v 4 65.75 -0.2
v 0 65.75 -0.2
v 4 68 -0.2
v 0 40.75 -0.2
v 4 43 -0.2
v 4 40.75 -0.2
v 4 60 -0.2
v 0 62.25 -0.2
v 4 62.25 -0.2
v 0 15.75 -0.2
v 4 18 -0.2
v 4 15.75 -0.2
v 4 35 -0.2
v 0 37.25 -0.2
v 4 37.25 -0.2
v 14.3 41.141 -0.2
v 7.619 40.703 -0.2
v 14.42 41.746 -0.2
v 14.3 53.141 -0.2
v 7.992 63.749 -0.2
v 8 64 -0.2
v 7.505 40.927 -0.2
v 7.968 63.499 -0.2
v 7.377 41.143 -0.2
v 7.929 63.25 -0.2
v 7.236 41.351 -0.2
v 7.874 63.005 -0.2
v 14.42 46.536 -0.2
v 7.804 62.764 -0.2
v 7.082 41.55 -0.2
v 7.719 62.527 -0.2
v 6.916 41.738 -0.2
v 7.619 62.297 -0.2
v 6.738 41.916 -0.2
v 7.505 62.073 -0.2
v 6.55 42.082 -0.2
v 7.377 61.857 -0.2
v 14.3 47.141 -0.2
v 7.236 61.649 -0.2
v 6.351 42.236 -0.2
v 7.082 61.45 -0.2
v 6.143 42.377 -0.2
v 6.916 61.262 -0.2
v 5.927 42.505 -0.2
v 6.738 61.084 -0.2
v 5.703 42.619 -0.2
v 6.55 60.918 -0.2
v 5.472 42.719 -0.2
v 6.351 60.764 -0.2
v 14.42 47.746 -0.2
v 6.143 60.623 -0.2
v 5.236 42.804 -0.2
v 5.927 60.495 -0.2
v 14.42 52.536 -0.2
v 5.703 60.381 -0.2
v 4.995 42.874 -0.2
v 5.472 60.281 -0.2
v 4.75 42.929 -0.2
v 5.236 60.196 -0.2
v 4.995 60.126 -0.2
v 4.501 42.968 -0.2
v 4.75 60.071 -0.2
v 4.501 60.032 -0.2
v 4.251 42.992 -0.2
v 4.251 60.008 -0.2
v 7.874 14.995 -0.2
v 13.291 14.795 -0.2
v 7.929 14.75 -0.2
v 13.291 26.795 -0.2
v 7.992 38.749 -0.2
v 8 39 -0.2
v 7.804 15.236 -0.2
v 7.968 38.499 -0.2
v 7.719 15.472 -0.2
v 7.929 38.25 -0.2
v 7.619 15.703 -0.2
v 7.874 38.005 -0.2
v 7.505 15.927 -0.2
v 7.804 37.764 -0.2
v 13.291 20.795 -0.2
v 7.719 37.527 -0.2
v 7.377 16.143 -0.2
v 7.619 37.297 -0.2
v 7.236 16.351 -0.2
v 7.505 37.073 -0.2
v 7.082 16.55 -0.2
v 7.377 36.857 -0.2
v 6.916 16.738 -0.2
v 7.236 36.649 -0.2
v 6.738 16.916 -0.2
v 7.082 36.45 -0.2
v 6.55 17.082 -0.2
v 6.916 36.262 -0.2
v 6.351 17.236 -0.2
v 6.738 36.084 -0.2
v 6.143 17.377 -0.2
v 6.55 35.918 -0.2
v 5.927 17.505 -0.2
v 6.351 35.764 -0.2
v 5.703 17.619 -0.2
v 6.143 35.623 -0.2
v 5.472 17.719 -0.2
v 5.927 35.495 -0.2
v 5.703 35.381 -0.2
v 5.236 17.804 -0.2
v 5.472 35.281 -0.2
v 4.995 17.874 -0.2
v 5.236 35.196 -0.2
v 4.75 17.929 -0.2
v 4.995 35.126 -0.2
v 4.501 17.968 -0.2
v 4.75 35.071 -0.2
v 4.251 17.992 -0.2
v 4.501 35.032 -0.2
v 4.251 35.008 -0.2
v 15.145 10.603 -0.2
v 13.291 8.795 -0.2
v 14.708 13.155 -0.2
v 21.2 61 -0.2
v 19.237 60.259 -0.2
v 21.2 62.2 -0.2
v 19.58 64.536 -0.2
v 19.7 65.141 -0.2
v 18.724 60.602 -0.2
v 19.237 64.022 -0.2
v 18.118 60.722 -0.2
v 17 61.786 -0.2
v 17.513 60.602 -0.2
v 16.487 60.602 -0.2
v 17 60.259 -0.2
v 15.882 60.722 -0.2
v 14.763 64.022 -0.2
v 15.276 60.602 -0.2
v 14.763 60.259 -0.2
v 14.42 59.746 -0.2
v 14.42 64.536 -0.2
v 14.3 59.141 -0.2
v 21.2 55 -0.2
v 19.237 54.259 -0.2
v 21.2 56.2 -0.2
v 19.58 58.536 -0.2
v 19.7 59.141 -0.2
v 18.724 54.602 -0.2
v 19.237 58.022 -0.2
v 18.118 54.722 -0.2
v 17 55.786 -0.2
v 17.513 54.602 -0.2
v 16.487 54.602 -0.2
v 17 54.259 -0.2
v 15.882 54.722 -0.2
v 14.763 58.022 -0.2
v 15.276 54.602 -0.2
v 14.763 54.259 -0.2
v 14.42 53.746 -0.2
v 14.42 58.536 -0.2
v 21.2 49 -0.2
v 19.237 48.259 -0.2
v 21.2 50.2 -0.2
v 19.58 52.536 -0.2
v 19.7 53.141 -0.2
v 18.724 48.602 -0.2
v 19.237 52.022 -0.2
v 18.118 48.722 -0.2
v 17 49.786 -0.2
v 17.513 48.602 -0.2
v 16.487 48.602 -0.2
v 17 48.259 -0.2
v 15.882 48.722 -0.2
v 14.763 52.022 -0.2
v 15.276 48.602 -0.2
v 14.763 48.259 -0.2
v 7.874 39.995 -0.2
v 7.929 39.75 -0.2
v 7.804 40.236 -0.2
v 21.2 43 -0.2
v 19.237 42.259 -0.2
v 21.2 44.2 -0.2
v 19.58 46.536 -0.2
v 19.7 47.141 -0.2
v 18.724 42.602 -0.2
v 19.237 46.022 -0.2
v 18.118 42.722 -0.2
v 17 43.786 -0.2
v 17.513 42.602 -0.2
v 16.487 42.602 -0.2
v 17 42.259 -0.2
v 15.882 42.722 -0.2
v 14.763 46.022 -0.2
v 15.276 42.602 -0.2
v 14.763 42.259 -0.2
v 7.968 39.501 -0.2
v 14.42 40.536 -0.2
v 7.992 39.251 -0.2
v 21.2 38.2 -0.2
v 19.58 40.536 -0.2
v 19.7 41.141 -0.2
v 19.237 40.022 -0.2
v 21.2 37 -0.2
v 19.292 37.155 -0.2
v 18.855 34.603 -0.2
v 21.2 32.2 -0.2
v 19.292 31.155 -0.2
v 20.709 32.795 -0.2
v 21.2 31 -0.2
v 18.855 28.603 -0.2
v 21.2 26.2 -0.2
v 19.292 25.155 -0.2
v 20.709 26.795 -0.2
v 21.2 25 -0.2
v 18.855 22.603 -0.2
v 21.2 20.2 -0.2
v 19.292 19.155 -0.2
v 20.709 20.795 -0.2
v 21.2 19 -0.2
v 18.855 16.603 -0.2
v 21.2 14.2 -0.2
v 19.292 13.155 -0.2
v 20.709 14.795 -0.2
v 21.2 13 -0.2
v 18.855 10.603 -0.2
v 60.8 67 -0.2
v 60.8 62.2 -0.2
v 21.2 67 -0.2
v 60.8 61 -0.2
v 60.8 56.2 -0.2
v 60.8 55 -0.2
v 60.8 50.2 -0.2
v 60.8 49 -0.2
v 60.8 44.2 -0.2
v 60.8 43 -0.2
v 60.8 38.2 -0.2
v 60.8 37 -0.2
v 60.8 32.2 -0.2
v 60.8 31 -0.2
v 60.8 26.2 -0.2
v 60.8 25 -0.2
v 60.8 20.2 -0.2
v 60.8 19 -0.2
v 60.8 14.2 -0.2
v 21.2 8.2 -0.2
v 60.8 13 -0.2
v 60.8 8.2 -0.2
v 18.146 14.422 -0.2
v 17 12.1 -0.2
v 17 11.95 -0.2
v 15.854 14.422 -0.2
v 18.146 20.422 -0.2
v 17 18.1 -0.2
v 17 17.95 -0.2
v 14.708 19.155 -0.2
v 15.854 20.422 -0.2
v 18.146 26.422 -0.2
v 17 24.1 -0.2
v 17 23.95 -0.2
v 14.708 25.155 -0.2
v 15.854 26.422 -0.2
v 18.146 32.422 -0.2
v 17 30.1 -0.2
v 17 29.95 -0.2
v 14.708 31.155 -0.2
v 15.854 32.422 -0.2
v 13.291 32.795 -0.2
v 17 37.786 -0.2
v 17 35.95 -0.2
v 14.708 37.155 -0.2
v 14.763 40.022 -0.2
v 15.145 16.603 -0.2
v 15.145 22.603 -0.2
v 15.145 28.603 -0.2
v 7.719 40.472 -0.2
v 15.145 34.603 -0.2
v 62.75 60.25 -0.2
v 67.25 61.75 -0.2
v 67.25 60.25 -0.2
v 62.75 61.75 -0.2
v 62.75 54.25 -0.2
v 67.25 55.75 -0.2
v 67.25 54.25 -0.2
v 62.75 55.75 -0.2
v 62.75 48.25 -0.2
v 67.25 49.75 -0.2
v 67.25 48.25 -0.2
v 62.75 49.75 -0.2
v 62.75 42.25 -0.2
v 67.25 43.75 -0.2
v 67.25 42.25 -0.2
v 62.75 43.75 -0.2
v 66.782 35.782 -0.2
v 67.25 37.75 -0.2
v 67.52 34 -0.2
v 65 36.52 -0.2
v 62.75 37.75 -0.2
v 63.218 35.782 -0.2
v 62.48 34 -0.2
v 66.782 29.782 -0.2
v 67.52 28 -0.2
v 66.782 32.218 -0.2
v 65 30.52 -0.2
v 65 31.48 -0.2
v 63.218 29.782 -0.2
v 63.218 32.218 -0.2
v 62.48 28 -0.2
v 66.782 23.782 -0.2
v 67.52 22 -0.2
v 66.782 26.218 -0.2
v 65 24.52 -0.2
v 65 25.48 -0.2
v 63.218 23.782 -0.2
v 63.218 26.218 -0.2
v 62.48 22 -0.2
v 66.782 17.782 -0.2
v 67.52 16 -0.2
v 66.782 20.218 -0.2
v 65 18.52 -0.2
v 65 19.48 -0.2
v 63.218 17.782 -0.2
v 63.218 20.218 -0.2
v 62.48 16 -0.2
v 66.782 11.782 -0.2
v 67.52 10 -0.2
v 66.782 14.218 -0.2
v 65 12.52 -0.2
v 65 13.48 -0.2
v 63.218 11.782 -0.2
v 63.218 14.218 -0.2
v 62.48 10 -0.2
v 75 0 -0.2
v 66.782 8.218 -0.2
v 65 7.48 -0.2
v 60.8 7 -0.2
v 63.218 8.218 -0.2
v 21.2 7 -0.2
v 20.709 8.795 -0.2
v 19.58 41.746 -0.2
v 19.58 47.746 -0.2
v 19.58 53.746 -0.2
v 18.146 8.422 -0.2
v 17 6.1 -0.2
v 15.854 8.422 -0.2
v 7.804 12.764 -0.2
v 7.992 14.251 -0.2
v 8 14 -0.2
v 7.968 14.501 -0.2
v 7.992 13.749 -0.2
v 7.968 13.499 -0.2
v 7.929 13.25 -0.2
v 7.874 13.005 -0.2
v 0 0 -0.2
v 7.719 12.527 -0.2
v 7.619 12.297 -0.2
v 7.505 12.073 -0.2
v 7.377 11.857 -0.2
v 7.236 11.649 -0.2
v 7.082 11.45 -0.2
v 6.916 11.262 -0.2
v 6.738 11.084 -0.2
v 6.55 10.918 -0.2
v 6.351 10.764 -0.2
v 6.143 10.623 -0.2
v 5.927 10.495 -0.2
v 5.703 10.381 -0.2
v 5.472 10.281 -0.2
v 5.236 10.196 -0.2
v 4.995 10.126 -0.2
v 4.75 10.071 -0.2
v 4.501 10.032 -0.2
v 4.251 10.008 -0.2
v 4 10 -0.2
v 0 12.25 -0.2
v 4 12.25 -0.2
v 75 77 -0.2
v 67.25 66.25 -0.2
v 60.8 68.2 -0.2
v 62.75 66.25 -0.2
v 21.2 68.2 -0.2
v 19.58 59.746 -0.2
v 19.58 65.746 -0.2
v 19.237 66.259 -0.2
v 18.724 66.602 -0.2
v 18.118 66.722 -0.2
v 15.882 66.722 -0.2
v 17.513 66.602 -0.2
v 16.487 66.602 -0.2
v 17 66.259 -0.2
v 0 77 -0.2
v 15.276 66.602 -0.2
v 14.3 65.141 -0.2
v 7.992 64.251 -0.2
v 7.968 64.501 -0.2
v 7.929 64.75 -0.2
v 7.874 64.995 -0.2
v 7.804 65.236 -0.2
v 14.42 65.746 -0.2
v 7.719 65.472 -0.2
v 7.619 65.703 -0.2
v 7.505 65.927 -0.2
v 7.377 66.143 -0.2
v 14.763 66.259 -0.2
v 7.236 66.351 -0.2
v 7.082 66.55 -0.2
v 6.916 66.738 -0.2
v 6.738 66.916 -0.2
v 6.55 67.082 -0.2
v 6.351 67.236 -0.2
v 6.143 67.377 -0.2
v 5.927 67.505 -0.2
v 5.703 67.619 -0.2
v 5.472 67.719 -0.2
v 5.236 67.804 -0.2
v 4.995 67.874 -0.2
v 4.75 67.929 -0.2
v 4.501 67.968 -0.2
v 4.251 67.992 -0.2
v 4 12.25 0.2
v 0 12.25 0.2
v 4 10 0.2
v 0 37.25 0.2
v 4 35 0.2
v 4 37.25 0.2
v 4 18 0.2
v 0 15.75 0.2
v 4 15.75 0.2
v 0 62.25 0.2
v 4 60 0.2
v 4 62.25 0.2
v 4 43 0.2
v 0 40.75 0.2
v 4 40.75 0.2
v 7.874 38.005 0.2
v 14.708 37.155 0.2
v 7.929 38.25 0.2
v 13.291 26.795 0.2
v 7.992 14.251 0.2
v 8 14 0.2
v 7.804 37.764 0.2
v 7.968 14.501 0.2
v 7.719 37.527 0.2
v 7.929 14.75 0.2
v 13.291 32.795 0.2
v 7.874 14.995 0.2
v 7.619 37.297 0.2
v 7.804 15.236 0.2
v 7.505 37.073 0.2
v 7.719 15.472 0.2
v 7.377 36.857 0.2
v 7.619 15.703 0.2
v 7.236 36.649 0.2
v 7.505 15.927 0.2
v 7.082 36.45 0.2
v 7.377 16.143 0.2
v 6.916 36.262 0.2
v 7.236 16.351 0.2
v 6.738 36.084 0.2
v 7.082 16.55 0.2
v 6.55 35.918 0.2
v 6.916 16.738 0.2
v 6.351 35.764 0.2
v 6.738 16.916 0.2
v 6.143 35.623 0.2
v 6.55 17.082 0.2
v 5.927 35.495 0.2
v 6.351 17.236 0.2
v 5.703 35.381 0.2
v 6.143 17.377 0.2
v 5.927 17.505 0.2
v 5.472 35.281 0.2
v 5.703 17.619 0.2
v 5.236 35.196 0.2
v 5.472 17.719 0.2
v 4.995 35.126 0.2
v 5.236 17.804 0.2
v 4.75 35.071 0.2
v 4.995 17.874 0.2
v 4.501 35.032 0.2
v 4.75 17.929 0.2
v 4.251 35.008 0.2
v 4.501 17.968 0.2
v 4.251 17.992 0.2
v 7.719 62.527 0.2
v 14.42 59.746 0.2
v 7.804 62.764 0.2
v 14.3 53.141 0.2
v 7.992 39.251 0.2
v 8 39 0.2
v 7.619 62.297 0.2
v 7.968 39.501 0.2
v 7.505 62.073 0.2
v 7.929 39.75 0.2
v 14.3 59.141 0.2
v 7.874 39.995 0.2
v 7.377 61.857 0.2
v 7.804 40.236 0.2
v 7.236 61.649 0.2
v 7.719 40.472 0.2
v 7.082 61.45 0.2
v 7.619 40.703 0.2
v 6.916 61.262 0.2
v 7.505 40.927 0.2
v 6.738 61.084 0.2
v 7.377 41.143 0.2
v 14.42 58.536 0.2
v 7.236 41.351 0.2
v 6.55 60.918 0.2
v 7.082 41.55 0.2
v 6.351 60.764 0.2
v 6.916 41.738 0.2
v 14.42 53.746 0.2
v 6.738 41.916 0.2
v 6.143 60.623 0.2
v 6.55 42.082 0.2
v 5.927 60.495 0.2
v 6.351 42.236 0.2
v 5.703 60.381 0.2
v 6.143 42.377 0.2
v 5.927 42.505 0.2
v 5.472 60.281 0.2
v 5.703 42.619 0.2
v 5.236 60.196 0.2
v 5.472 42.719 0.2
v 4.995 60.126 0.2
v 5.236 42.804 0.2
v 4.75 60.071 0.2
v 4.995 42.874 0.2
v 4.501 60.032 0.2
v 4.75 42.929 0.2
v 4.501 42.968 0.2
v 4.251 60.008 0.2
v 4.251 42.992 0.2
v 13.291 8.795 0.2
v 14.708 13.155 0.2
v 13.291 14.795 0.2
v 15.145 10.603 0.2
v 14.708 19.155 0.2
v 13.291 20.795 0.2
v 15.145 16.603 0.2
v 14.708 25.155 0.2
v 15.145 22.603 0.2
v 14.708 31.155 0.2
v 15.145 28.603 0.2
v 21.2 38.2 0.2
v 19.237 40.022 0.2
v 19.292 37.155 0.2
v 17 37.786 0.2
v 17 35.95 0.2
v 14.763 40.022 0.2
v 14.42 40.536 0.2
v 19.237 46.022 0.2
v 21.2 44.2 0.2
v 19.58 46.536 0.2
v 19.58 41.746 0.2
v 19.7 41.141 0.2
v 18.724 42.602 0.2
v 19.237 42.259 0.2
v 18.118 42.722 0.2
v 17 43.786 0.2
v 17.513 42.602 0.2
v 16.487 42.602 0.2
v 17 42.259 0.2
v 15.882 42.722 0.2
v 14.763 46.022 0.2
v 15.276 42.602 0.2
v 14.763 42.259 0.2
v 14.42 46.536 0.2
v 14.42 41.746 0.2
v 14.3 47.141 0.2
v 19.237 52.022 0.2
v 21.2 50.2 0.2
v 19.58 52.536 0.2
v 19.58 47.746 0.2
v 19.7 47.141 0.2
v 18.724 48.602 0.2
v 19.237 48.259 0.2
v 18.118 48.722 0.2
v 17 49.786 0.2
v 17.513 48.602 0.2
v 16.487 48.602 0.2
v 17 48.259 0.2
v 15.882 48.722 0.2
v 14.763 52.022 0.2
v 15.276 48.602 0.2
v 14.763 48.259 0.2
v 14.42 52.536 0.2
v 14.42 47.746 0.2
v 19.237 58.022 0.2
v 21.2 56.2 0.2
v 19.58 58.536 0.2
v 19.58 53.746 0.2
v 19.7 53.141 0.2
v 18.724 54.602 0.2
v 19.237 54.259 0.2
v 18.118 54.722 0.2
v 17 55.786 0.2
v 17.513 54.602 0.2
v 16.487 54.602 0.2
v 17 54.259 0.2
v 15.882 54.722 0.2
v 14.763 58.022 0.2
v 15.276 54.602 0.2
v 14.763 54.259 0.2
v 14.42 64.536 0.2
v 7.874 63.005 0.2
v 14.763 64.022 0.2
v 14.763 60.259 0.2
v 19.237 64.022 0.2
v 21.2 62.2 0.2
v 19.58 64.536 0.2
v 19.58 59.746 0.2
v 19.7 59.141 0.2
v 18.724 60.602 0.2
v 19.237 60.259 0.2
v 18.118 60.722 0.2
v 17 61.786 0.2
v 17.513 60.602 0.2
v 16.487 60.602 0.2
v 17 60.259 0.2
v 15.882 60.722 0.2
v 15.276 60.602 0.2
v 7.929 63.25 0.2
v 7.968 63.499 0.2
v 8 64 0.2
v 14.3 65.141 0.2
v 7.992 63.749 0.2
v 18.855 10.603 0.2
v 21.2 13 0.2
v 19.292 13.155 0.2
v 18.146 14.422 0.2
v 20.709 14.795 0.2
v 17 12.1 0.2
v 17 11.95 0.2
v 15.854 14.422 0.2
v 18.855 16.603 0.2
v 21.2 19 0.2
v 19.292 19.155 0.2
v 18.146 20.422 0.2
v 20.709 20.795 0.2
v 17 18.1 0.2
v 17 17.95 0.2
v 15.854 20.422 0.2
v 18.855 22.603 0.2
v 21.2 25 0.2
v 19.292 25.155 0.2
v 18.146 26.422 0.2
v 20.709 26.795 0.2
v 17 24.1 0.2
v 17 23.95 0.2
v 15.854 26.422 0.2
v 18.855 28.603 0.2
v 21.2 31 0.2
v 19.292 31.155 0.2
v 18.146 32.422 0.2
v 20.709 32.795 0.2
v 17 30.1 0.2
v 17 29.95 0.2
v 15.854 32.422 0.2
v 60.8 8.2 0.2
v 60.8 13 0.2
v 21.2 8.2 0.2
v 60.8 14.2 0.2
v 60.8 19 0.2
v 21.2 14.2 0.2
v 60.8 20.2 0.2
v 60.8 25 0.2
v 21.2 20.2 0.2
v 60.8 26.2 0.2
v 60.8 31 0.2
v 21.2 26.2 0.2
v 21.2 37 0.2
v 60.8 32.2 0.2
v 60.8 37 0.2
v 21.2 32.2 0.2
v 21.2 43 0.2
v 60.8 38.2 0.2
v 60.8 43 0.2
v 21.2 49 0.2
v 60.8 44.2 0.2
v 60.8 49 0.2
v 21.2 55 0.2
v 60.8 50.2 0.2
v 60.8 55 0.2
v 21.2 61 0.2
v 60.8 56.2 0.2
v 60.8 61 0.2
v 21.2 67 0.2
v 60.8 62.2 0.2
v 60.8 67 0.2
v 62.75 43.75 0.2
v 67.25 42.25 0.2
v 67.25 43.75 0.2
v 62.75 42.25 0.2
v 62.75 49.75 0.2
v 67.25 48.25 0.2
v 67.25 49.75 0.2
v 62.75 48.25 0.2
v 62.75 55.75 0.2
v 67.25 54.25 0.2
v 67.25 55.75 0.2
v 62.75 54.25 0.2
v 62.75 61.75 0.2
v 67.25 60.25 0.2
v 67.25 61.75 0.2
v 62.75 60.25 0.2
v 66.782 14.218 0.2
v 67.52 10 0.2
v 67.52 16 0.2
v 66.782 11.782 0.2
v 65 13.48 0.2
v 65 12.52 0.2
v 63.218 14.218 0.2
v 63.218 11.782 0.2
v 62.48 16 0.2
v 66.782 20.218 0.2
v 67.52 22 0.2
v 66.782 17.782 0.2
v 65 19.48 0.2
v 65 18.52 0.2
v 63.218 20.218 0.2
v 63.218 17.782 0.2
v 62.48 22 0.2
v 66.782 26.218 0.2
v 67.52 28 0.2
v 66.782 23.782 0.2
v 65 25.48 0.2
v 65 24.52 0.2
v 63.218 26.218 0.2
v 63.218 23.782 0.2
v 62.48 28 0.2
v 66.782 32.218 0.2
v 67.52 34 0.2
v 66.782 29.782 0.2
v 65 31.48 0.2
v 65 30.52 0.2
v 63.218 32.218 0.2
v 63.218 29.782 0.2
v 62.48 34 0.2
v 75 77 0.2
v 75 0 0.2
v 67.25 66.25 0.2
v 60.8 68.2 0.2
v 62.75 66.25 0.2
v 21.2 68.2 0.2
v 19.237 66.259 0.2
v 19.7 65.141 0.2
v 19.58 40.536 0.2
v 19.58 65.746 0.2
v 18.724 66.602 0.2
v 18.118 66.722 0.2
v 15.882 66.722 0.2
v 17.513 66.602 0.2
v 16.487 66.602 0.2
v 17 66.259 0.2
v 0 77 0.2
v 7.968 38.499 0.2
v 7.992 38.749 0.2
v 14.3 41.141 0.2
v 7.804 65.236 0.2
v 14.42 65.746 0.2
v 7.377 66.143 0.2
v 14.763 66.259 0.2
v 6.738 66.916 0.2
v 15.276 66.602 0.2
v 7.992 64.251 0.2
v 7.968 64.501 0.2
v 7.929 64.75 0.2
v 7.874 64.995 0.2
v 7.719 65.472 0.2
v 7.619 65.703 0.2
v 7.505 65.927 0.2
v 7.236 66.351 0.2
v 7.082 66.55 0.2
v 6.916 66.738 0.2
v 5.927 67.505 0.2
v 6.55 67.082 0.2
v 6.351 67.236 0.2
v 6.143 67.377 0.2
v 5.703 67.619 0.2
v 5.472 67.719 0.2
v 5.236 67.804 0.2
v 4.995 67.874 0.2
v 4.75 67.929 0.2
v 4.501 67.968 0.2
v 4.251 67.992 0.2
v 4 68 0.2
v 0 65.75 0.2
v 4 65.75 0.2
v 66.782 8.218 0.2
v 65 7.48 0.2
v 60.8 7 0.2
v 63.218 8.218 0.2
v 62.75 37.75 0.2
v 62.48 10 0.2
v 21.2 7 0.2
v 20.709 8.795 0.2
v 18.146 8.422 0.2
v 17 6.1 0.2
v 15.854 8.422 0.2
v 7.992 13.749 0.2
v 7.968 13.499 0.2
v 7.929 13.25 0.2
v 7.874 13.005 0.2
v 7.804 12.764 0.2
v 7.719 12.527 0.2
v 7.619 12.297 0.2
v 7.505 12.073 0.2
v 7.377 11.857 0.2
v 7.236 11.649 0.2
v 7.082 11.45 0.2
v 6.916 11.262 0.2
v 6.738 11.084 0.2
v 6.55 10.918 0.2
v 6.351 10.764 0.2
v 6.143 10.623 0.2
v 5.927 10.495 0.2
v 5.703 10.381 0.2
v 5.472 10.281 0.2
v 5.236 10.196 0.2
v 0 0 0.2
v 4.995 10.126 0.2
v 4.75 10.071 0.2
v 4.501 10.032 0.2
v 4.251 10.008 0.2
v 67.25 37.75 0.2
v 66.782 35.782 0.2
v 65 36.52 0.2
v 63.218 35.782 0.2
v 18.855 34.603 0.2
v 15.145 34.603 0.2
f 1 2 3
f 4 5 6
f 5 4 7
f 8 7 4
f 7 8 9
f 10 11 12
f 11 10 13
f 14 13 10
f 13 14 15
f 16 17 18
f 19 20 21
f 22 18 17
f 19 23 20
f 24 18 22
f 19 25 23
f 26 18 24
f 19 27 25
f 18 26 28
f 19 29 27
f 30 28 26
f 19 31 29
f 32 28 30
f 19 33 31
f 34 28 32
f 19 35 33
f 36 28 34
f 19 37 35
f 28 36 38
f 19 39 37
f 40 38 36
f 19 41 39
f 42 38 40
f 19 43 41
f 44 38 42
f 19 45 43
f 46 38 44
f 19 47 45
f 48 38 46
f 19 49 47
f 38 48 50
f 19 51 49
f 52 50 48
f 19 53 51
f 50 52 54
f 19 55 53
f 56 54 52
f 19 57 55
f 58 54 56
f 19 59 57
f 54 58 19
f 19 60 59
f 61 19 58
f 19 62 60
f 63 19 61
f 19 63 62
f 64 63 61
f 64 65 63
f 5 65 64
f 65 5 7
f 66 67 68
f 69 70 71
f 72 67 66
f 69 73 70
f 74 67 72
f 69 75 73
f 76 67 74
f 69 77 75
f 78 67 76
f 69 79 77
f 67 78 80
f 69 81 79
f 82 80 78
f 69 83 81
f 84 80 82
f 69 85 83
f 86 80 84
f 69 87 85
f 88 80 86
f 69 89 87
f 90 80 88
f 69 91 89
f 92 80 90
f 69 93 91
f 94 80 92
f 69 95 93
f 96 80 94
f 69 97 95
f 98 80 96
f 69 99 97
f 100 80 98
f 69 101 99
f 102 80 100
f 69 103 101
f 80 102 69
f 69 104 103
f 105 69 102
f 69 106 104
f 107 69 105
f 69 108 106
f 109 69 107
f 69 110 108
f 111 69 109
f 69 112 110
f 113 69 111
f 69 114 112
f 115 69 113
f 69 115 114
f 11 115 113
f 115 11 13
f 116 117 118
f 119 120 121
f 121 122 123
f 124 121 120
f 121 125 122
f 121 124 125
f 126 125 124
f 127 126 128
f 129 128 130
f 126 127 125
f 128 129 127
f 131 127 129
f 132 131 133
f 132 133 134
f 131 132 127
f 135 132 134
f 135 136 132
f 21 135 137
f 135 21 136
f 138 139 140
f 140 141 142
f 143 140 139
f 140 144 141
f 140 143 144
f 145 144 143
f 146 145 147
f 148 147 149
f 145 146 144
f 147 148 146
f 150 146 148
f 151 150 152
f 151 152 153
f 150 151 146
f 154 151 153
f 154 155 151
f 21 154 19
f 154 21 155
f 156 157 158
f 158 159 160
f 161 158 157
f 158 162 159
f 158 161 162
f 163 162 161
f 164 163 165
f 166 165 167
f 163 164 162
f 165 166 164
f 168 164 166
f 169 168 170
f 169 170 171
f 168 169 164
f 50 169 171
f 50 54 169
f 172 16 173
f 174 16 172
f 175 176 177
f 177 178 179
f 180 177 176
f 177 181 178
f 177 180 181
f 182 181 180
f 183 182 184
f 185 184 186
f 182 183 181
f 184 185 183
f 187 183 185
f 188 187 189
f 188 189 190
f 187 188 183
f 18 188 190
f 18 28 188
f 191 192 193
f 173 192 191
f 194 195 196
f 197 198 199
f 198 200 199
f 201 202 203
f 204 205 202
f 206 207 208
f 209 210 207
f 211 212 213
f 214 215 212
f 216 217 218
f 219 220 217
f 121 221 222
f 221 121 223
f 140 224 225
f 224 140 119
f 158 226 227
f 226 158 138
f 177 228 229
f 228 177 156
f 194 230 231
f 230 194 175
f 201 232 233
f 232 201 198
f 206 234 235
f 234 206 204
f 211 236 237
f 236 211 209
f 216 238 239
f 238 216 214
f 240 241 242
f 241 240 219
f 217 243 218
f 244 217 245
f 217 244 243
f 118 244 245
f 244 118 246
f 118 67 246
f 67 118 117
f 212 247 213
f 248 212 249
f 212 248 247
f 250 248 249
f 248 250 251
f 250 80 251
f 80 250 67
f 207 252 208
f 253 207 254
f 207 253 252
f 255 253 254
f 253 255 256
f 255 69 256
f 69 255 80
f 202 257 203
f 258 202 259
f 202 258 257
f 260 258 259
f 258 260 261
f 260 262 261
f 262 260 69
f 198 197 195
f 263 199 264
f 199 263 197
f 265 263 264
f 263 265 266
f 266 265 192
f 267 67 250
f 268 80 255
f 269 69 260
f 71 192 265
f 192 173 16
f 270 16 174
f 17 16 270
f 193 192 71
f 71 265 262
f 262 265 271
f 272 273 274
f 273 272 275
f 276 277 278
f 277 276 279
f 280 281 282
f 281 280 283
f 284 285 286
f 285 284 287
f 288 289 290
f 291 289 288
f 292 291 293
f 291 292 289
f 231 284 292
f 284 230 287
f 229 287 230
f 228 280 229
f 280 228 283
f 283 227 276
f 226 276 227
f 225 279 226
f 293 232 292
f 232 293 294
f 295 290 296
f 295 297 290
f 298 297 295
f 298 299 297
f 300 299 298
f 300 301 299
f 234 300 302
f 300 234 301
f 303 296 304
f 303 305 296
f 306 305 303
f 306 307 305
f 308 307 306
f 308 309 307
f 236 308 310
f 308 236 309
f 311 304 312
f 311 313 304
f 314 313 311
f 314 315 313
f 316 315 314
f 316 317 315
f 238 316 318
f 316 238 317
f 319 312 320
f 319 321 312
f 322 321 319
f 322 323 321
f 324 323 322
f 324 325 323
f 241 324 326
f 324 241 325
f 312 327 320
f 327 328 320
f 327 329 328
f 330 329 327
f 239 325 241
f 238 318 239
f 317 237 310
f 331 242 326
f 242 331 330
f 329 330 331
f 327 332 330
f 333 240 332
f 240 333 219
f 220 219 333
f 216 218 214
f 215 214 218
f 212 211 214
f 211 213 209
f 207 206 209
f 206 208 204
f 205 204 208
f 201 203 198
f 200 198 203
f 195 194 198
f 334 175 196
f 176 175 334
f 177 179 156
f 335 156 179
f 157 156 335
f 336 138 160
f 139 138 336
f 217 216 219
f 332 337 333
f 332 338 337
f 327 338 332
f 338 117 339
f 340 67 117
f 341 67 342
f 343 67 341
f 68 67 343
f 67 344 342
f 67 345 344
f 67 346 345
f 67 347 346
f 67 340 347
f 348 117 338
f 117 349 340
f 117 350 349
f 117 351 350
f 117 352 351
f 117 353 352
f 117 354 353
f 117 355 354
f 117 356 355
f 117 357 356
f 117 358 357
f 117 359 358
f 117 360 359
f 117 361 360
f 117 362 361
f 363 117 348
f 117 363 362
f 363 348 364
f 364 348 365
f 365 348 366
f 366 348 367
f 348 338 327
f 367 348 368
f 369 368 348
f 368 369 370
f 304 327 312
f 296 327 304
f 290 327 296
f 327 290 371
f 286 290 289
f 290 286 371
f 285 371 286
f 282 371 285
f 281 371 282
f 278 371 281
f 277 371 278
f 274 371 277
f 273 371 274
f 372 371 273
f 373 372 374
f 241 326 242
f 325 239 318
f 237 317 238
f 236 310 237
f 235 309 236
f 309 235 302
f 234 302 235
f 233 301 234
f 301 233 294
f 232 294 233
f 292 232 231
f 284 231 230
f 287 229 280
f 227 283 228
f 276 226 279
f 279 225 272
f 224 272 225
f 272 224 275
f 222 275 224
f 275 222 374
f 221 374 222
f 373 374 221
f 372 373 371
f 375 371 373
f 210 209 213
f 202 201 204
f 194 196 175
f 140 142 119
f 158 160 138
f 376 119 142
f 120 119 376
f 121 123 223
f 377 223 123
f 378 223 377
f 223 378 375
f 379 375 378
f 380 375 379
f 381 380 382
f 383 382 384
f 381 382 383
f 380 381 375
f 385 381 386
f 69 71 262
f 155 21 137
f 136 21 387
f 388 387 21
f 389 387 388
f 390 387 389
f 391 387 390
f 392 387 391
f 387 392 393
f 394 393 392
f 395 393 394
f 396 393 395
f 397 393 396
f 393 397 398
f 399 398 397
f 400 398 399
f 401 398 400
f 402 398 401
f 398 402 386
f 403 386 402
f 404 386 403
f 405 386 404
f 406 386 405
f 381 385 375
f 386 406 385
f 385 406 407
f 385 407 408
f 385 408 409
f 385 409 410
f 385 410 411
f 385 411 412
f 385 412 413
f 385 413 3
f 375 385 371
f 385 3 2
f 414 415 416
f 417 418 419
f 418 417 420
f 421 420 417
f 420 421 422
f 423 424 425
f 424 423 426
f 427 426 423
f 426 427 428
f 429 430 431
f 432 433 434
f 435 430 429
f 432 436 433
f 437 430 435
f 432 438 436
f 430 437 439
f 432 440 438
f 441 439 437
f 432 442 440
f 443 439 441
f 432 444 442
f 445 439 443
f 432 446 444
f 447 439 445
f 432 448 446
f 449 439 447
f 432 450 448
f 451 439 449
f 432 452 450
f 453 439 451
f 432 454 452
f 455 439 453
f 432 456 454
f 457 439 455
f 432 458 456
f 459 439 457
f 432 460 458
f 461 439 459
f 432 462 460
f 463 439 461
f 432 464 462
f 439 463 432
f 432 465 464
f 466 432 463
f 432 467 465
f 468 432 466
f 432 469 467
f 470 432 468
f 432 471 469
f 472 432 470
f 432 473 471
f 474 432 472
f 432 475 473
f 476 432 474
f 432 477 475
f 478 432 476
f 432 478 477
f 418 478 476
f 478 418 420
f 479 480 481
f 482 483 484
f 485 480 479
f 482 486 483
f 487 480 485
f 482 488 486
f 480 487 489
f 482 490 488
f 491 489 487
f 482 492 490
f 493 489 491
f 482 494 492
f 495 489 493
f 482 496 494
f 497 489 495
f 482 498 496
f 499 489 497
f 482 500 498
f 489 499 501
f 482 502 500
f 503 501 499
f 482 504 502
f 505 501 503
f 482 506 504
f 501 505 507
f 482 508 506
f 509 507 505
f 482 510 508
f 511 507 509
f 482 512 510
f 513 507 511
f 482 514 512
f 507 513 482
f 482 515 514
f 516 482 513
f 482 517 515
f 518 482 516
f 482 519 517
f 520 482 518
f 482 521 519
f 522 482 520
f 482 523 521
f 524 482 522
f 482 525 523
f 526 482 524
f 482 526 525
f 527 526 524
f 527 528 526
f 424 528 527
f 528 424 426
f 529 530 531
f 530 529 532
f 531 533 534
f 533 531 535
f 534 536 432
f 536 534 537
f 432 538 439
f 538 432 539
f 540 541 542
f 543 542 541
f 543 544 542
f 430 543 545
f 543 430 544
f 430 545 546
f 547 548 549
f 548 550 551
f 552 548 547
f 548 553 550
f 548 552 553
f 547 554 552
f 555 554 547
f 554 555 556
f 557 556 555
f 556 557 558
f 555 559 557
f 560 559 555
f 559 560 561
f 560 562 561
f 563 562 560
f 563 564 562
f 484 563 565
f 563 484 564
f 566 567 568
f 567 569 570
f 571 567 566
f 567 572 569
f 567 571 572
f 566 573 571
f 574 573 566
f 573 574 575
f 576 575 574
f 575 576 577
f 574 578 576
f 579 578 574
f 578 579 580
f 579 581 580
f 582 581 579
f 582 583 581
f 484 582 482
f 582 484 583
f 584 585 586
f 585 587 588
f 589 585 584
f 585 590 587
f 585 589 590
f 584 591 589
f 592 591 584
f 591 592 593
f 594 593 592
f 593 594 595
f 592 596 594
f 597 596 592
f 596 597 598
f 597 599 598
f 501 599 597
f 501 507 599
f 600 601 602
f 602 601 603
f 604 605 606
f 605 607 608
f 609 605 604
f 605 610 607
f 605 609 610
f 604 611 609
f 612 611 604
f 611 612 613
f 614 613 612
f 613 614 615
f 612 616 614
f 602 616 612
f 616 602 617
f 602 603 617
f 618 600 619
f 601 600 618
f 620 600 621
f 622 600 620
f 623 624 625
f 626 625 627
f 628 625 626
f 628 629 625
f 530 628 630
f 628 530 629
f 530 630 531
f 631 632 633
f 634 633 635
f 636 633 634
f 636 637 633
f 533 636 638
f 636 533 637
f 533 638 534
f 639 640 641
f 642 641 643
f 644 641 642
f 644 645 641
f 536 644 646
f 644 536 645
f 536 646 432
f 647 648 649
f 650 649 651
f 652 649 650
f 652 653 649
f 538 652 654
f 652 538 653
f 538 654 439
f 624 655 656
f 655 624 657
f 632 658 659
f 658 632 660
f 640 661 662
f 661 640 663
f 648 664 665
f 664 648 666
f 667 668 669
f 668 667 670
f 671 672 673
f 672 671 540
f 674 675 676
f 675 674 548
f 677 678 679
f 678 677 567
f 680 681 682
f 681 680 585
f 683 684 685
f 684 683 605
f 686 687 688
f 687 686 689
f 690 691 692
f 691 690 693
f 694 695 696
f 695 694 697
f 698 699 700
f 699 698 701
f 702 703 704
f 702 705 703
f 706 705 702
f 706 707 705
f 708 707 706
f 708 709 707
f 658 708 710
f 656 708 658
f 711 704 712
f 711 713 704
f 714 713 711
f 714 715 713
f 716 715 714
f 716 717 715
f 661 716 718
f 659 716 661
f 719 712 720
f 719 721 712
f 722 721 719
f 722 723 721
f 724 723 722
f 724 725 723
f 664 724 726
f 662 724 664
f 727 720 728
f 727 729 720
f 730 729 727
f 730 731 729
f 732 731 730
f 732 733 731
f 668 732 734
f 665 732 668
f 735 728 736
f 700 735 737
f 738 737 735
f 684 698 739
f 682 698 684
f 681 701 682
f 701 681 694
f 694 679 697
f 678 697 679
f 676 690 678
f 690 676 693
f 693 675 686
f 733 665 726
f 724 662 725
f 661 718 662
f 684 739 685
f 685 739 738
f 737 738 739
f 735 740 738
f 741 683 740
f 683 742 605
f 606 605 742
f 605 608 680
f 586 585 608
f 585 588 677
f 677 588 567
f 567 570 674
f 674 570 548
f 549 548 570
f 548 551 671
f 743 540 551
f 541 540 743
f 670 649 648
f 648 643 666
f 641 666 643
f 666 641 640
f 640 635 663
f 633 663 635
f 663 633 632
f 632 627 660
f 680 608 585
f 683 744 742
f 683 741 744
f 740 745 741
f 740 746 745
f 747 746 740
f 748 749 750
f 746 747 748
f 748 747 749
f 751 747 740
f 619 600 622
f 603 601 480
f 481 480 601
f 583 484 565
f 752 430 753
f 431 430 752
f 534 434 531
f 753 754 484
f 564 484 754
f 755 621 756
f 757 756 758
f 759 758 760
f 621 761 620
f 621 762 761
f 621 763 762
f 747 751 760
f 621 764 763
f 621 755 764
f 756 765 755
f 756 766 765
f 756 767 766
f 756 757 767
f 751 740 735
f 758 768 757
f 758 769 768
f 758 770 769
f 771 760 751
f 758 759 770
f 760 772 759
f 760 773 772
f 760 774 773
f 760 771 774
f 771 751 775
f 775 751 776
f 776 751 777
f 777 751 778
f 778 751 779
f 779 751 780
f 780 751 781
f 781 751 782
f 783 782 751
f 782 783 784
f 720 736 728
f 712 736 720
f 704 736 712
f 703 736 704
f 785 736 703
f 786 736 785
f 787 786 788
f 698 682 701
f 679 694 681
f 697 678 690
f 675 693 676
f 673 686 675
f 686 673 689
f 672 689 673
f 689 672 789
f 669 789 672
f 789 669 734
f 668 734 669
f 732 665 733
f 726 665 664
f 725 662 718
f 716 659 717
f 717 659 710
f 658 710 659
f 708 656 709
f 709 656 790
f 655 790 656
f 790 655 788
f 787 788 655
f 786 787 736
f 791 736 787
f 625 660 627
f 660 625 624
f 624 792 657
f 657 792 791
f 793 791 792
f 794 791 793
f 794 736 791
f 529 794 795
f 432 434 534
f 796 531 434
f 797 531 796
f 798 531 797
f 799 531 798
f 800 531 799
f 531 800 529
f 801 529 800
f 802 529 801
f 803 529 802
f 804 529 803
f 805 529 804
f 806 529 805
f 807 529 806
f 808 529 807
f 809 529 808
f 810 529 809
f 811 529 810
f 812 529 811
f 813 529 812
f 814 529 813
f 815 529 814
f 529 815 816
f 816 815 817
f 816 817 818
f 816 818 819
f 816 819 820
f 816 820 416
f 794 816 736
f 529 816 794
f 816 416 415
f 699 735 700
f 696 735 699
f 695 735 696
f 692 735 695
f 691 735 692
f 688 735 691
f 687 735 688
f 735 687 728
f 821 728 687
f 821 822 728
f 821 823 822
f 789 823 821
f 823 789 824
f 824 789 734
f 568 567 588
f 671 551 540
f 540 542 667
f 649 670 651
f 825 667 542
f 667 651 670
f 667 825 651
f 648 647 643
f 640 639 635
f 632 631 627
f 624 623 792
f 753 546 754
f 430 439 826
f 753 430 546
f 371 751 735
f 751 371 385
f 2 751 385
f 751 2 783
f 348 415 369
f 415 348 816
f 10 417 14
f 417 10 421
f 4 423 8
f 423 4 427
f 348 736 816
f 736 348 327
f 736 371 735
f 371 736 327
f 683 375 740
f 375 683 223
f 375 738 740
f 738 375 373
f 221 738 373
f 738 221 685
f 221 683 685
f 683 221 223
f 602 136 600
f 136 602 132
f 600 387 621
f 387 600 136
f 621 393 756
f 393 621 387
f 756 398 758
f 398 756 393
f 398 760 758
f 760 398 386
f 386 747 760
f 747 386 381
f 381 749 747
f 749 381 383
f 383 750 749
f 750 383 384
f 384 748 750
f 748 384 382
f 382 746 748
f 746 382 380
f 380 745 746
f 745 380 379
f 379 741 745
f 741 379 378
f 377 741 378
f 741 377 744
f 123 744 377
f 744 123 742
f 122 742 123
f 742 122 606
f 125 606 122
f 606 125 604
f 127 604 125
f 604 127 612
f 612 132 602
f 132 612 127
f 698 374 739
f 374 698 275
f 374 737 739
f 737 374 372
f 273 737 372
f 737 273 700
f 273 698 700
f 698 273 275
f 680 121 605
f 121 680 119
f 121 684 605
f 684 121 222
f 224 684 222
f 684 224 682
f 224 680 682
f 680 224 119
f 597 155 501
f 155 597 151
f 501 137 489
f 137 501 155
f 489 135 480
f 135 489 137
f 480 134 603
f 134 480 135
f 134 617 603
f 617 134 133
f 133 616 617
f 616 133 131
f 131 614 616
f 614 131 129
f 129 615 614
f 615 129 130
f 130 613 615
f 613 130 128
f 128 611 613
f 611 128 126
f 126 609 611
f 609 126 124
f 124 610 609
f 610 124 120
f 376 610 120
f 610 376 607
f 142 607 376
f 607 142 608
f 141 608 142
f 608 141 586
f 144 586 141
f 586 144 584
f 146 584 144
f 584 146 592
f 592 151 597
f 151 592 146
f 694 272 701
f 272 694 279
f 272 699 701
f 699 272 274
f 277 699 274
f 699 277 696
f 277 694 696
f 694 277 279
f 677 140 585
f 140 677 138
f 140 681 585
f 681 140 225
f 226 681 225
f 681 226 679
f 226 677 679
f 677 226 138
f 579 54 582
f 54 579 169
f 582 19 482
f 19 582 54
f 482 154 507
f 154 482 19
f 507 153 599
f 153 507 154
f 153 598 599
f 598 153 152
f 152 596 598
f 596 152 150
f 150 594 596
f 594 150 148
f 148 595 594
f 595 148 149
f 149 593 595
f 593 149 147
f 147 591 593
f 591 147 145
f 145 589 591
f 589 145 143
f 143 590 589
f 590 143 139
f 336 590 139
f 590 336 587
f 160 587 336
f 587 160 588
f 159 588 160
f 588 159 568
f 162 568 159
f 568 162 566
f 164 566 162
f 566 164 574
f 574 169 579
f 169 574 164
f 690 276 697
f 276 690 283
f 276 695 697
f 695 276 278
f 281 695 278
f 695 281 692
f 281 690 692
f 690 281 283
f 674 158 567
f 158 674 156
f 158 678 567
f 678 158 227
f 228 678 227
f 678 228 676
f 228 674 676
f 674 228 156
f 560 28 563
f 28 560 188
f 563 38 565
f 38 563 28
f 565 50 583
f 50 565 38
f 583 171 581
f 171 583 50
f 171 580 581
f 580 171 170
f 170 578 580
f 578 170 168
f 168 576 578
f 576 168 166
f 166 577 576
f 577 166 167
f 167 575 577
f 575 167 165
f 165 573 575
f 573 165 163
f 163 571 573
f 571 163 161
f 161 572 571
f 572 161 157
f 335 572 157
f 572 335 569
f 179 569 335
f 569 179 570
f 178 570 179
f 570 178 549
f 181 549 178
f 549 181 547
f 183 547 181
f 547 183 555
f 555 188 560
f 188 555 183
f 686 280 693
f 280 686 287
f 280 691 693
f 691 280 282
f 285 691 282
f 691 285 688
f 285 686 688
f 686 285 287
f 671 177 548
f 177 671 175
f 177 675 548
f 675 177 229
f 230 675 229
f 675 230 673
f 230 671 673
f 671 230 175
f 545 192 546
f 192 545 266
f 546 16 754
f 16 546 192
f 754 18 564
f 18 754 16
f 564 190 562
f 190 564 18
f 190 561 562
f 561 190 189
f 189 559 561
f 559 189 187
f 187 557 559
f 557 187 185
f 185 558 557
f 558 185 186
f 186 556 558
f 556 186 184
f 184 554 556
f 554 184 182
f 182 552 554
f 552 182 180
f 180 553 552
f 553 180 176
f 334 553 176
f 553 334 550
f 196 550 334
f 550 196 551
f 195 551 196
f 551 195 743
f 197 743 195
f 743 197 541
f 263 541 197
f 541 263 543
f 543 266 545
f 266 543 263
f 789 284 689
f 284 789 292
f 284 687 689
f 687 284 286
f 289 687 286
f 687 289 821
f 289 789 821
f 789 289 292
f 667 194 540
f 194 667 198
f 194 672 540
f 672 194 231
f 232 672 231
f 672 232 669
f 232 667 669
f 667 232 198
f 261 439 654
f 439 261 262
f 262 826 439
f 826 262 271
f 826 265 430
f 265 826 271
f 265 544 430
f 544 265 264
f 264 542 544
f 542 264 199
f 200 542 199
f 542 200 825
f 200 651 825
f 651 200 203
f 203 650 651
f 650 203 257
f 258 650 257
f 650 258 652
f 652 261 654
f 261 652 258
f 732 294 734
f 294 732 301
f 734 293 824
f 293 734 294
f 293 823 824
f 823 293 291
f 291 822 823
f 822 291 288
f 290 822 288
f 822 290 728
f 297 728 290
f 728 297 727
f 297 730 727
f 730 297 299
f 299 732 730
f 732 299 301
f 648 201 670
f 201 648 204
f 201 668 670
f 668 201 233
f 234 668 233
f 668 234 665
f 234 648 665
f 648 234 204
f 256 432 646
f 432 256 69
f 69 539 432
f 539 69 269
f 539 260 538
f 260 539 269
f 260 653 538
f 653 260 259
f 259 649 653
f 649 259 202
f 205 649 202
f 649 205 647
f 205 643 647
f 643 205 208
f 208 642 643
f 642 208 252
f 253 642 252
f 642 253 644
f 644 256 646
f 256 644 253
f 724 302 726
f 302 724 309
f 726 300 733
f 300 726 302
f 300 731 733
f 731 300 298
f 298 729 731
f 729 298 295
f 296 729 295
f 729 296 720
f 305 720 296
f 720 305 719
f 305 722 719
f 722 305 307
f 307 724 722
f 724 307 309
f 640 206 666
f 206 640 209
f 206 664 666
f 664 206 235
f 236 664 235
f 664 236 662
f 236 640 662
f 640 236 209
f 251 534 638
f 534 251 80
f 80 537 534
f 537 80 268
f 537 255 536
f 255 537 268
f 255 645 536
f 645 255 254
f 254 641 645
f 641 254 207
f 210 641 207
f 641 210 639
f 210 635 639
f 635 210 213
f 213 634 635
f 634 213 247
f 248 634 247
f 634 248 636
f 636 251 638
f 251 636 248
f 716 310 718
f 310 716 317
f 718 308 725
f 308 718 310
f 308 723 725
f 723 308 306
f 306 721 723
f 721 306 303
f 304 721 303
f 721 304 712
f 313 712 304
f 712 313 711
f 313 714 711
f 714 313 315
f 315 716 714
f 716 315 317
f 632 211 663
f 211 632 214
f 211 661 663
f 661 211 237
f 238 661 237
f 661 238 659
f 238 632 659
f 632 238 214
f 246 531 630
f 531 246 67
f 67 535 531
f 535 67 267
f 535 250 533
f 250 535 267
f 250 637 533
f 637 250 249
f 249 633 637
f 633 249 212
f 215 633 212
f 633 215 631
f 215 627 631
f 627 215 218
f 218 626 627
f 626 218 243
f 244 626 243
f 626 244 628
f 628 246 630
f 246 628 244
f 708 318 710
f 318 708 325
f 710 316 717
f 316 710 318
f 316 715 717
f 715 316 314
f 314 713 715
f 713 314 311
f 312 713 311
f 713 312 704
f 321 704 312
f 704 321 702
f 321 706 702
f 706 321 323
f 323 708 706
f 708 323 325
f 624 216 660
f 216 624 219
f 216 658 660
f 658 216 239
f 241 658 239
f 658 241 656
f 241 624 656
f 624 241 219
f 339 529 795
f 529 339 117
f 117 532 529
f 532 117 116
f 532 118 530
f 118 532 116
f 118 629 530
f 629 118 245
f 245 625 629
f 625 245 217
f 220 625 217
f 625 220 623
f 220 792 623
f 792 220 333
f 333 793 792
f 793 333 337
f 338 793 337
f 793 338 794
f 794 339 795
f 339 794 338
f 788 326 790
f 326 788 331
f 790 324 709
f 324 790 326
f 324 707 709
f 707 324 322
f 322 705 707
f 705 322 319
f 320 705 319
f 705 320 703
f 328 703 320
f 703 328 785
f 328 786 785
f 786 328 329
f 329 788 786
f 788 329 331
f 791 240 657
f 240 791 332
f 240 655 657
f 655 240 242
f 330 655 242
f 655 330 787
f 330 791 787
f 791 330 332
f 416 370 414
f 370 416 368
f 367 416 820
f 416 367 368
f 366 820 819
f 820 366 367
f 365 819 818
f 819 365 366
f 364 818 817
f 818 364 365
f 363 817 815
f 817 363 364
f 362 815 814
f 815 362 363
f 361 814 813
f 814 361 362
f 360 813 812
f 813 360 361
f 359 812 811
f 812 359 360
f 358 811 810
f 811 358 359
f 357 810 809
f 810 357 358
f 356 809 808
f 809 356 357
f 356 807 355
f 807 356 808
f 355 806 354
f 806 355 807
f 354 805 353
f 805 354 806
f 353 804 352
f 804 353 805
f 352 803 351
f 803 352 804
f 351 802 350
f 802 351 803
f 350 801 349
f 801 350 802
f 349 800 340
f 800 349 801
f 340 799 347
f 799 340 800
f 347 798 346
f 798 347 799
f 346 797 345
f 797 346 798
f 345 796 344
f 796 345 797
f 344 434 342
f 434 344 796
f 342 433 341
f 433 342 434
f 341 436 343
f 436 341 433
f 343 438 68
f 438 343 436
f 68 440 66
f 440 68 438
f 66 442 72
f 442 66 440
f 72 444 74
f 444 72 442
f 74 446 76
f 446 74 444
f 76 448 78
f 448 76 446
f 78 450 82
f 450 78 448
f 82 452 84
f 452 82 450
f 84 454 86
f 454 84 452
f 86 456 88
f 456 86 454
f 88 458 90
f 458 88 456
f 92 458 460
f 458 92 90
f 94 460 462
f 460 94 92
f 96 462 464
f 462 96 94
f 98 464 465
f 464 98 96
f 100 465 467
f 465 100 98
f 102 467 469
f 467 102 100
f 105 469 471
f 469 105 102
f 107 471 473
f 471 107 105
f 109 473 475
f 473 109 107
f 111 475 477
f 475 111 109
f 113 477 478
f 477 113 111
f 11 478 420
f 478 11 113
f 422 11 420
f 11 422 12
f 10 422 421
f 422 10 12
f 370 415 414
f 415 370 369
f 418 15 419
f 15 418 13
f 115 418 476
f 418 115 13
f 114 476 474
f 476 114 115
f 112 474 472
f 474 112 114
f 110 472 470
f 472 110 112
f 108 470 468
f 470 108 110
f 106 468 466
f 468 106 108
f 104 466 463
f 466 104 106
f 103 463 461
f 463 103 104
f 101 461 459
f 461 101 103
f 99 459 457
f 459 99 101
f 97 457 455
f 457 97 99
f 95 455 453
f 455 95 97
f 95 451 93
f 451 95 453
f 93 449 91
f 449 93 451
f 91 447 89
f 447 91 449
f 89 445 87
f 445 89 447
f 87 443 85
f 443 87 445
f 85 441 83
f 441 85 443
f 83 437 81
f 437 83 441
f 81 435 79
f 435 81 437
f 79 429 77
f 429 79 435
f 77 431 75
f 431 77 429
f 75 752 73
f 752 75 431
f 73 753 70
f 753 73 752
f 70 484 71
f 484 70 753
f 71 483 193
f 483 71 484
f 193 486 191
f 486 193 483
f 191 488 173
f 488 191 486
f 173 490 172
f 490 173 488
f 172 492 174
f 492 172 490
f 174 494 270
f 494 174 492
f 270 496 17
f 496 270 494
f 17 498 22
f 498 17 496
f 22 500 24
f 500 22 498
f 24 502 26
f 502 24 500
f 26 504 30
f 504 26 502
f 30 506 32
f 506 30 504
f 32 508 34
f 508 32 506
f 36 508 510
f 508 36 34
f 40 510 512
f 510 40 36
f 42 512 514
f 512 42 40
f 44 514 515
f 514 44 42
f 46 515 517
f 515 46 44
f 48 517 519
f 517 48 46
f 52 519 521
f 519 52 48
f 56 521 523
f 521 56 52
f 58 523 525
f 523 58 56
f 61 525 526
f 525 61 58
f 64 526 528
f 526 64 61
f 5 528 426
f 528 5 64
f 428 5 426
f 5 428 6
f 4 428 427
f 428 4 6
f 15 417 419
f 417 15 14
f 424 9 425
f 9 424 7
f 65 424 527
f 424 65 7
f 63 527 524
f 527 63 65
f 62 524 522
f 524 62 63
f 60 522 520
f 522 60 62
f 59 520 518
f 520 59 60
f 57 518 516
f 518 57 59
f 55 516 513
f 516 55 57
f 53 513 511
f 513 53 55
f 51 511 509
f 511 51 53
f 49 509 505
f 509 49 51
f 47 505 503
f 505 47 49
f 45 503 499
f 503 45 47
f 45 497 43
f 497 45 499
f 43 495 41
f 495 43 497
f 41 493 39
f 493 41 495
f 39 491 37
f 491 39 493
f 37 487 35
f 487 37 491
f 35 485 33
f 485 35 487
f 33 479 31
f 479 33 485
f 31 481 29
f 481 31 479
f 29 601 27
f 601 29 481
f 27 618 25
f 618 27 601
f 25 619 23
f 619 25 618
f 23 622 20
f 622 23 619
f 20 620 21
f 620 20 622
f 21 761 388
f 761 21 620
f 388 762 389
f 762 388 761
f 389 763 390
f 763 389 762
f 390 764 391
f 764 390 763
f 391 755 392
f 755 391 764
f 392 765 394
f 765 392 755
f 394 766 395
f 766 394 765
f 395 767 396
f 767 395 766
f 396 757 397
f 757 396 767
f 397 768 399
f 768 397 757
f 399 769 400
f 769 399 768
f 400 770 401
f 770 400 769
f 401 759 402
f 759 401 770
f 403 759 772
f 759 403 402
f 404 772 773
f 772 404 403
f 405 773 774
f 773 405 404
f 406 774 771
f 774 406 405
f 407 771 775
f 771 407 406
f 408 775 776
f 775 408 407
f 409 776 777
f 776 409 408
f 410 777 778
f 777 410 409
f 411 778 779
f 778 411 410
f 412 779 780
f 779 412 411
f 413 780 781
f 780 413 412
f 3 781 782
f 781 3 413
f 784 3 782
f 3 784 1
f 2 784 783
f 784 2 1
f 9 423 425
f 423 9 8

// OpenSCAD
// by tinaw 2016-06

module stencil() {
difference() {

//STENCIL
stencil_width = 75; // stencil_width = width of stencil in mm
stencil_height = 77; // stencil_height = height of stencil in mm
margin_left = 17; // left margin
margin_right = 10; // right margin
margin_top = 10; // top margin
margin_bottom = 10; // bottom margin

square(size = [stencil_width, stencil_height], center = false);


//LINES
spacing = 6; // space between lines in mm
line_length_auto = stencil_width - margin_left - margin_right - spacing*1.4;
line_length = line_length_auto; // line_length = length of lines, centered between icons
line_count_auto = round((stencil_height - margin_top - margin_bottom)/spacing); // maximum number of lines
line_count = line_count_auto; // line_count = number of lines with boxes 



for ( lines = [ 0 : line_count ] ) {
  translate ( [ (margin_left + spacing*0.7), margin_bottom + spacing/2 + spacing  * (lines-1), 0 ] ) {
    square(size = [line_length, 1.2], center = false); // line slot
  }
}


// STARS bottom left
points = 5; // points = number of points (minimum 3)
outer = spacing*0.65; // outer  = radius to outer points. 0.65 makes stars not fully close, but make for better shapes when drawn from
inner = outer/2 ; // inner  = radius to inner points

for ( stars = [ 1: round(line_count/2) ] ) {
  translate ( [ margin_left, margin_bottom + spacing  * (stars-1), 0 ] ) {
  Star(points, outer, inner);
  }
}


// HEARTS top left
heartsize = spacing*0.9; // heartsize = height of finished heart
for ( stars = [ round(line_count/2)+1 : line_count ] ) {

  translate ( [ margin_left, margin_bottom + spacing  * (stars-1), 0 ] ) {
    heart(heartsize);
  }
}



// CIRCLES bottom right, 
radius = spacing*0.42; // radius = circle radius
x_position = stencil_width - margin_right;

for ( circles = [ 1 : round(line_count/2) ] ) {
  translate ( [ x_position, margin_bottom + spacing  * (circles-1), 0 ] ) {
  circle(radius);
  }
}

// SQUARES top right
square_side = spacing*0.75; // square_side = square side
x_position = stencil_width - margin_right;

for ( squares = [ round(line_count/2)+1 : line_count ] ) {
  translate ( [ x_position, margin_bottom + spacing  * (squares-1), 0 ] ) {
  square(size = square_side, center = true);
  }
}

}
}

// anoved Star module, https://gist.github.com/anoved/9622826
module Star(points, outer, inner) {
	
	// polar to cartesian: radius/angle to x/y
	function x(r, a) = r * cos(a);
	function y(r, a) = r * sin(a);
	
	// angular width of each pie slice of the star
	increment = 360/points;
	
	union() {
		for (p = [0 : points-1]) {
			
			// outer is outer point p
			// inner is inner point following p
			// next is next outer point following p

                    x_outer = x(outer, increment * p);
					y_outer = y(outer, increment * p);
					x_inner = x(inner, (increment * p) + (increment/2));
					y_inner = y(inner, (increment * p) + (increment/2));
					x_next  = x(outer, increment * (p+1));
					y_next  = y(outer, increment * (p+1));
            {
                rotate(-18) {
				polygon(points = [[x_outer, y_outer], [x_inner, y_inner], [x_next, y_next], [0, 0]], paths  = [[0, 1, 2, 3]]);
			}}
		}
	}
}


module heart(heartsize) {
resize([heartsize,0,0], auto=true) {
        translate([0,-7]) {
                rotate(a=(45)) {
            union() {
                square(10,10);
                translate([10/2,10,0]) circle(10/2);
                translate([10,10/2,0]) circle(10/2);
                }
            }
        }
    }

}


module punch(){
w = 3.5/2;
union(){
intersection(){
translate([4,4,0]){
circle(r=4,$fn=100);
}

polygon([[-1,4],[-1,8],[8,8],[8,4]]);
}

polygon([[4-w,0],[4-w,4],[4+w,4],[4+w,0]]);
}
}


module punches(offset,count){
	spacing = 25;
	c = count;
	o = offset;

	for ( punches = [ 1 : c ] ) {
	 	translate ( [ o + spacing * (punches-1), 0, -1 ] ) {
    	punch();
  		}
	}
}



difference() {

  linear_extrude(height = 0.4, center = true, convexity = 10, twist = 0) stencil();

      linear_extrude(height = 0.5, center = true, convexity = 10, twist = 0) rotate (270) mirror(1,0,1)  punches(10,7); // comment this for no circa holes


 }
